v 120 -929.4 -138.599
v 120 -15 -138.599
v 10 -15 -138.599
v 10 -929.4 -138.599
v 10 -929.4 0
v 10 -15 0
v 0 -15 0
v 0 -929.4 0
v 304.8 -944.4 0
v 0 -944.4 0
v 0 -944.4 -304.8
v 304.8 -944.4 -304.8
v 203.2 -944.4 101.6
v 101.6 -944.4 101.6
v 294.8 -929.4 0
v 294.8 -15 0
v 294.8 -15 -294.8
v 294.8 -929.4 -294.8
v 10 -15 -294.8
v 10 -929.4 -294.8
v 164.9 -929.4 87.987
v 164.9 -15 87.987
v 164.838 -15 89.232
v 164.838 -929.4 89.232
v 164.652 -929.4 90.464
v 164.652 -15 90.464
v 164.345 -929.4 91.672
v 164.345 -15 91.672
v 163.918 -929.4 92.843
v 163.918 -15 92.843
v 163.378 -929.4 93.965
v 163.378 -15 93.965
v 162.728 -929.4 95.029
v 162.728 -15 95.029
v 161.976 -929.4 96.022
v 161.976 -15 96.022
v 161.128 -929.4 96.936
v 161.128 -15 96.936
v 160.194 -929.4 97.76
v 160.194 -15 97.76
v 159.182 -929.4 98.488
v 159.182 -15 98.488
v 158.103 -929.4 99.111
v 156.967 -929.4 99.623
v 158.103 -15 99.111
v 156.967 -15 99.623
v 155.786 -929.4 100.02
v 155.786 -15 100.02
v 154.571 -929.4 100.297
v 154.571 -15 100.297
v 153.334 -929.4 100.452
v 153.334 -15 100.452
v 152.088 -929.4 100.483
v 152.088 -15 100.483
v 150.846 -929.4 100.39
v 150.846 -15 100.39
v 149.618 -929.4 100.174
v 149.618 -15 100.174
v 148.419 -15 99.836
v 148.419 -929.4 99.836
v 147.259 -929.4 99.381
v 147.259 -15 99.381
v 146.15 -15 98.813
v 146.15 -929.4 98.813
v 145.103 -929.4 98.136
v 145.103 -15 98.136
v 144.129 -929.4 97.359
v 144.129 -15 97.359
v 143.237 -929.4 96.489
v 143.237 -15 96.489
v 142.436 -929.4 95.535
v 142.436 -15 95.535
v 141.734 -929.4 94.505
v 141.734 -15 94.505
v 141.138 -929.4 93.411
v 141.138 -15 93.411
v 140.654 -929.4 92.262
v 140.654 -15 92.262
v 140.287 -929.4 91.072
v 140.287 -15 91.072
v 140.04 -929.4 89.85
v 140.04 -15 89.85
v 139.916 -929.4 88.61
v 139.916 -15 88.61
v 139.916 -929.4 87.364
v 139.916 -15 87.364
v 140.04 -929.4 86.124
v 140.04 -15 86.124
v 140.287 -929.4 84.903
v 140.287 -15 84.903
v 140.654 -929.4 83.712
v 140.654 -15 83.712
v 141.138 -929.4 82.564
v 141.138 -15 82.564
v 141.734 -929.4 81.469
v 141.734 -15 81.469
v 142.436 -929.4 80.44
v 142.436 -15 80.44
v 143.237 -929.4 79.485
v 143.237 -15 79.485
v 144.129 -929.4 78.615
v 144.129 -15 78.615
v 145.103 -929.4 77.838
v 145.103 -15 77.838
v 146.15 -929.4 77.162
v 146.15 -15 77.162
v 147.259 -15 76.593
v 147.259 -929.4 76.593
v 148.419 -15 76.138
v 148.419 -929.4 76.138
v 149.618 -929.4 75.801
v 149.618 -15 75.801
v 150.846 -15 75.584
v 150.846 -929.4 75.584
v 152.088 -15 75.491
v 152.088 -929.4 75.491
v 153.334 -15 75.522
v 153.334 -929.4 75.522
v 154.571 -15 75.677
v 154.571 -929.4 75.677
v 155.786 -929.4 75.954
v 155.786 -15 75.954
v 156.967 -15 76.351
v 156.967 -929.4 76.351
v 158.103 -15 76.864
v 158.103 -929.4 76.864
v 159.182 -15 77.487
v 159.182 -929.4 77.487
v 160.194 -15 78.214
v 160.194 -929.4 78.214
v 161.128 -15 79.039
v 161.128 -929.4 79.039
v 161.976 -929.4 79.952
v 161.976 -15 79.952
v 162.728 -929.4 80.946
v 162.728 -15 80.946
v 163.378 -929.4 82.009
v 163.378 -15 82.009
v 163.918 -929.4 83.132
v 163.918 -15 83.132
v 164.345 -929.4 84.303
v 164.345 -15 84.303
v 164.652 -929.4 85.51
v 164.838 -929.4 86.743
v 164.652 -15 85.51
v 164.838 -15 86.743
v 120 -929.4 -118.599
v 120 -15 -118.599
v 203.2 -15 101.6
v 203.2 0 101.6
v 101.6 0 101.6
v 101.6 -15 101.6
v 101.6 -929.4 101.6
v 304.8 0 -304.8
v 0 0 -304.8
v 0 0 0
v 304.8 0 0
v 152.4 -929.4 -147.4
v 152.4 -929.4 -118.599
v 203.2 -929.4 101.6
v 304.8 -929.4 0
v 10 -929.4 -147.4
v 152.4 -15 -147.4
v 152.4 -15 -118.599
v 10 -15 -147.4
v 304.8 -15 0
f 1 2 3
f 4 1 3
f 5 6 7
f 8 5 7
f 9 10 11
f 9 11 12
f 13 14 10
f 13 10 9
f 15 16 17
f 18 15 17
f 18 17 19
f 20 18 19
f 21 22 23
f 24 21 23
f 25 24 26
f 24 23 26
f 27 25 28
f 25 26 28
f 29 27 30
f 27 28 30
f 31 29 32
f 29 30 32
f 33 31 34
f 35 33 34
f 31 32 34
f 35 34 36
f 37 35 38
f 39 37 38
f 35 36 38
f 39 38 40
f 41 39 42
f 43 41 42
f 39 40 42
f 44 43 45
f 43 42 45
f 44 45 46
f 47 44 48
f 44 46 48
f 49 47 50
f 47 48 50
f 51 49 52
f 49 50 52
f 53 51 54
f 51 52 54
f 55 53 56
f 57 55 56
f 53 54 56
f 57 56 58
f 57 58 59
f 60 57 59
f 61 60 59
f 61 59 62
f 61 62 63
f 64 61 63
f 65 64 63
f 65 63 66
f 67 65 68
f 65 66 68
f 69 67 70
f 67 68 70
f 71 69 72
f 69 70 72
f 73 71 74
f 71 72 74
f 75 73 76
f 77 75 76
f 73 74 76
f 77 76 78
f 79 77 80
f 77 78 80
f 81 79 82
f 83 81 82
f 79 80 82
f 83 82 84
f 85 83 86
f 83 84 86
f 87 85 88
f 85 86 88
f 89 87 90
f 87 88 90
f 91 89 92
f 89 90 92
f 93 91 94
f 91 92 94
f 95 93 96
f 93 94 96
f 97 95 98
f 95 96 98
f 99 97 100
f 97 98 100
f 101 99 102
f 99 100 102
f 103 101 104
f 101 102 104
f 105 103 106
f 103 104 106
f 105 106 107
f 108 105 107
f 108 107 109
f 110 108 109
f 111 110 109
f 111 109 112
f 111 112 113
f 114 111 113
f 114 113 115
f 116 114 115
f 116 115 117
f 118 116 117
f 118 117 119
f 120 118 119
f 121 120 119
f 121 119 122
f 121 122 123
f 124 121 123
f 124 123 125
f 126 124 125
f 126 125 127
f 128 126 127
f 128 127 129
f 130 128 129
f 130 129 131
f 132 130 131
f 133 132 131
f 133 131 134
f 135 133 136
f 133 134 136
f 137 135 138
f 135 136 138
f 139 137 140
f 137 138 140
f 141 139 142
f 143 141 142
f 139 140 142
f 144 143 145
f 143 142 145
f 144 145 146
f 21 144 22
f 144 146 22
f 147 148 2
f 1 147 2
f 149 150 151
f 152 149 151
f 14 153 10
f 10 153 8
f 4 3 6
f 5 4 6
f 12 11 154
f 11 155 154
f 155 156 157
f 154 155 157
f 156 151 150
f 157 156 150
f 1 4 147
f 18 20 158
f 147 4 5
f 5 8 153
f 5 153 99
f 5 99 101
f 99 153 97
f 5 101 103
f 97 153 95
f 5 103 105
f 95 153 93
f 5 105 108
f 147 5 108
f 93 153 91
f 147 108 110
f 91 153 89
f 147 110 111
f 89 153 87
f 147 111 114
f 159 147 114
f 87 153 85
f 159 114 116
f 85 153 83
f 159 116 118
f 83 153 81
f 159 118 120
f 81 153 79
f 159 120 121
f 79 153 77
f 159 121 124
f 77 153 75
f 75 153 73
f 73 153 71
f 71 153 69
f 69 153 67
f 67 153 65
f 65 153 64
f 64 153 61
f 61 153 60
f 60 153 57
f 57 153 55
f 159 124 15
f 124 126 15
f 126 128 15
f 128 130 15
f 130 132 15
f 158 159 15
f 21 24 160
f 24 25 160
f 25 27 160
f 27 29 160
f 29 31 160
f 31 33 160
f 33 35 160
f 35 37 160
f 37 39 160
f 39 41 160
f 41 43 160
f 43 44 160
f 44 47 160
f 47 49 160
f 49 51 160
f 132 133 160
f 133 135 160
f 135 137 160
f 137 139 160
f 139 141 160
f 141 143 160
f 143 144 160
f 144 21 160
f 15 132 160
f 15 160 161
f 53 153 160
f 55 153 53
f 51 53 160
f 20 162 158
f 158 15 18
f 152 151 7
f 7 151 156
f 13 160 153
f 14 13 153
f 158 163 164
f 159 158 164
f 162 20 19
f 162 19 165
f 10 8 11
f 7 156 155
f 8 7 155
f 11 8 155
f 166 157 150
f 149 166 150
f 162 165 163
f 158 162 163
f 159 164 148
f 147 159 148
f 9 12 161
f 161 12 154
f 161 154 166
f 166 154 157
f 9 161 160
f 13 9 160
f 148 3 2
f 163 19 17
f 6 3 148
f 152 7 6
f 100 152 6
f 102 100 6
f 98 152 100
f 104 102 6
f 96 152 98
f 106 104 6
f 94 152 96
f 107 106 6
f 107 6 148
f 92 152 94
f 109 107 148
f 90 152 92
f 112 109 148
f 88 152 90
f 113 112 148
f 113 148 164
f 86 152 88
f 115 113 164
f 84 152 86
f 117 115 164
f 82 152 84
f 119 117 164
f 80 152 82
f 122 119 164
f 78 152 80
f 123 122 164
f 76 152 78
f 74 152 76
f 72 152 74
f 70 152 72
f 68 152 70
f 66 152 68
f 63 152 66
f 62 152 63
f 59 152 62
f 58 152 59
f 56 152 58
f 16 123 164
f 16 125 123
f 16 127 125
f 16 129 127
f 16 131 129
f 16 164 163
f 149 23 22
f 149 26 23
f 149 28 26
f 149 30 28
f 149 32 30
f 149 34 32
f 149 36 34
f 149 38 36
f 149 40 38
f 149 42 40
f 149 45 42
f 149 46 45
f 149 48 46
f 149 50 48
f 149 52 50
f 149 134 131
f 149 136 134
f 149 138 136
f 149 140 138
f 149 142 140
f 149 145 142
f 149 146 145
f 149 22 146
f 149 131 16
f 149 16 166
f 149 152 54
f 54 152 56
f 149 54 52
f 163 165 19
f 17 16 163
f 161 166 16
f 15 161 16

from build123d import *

# Parameters (mm, degrees)
F1_DEPTH = 15
F2_R     = 12.5
F3_DEPTH = 914.4
F5_DEPTH = 914.4
F7_DEPTH = 15
F9_DEPTH = 914.4


with BuildPart() as f1:
    # F0 (on Front) → F1 (new body)
    with BuildSketch(Plane.XZ):
        Polygon((101.6, 101.6), (0, 0), (0, -304.8), (304.8, -304.8), (304.8, 0), (203.2, 101.6), align=None)
    extrude(amount=F1_DEPTH)

    # F2 (on face) → F3 (join)
    with BuildSketch(Plane.XZ.offset(15)):
        with Locations((152.4, 87.9872098923)):
            Circle(F2_R)
    extrude(amount=F3_DEPTH)

    # F4 (on face) → F5 (join)
    with BuildSketch(Plane.XZ.offset(15)):
        Polygon((294.8, 0), (294.8, -294.8), (10, -294.8), (10, 0), (0, 0), (0, -304.8), (304.8, -304.8), (304.8, 0), align=None)
    extrude(amount=F5_DEPTH)

    # F6 (on face) → F7 (join)
    with BuildSketch(Plane.XZ.offset(929.4)):
        Polygon((0, 0), (0, -304.8), (304.8, -304.8), (304.8, 0), (203.2, 101.6), (101.6, 101.6), align=None)
    extrude(amount=F7_DEPTH)

    # F8 (on face) → F9 (join)
    with BuildSketch(Plane.XZ.offset(15)):
        Polygon((10, -147.4), (152.4, -147.4), (152.4, -118.5992388964), (120, -118.5992388964), (120, -138.5992388964), (10, -138.5992388964), align=None)
    extrude(amount=F9_DEPTH)


solid = f1.part
